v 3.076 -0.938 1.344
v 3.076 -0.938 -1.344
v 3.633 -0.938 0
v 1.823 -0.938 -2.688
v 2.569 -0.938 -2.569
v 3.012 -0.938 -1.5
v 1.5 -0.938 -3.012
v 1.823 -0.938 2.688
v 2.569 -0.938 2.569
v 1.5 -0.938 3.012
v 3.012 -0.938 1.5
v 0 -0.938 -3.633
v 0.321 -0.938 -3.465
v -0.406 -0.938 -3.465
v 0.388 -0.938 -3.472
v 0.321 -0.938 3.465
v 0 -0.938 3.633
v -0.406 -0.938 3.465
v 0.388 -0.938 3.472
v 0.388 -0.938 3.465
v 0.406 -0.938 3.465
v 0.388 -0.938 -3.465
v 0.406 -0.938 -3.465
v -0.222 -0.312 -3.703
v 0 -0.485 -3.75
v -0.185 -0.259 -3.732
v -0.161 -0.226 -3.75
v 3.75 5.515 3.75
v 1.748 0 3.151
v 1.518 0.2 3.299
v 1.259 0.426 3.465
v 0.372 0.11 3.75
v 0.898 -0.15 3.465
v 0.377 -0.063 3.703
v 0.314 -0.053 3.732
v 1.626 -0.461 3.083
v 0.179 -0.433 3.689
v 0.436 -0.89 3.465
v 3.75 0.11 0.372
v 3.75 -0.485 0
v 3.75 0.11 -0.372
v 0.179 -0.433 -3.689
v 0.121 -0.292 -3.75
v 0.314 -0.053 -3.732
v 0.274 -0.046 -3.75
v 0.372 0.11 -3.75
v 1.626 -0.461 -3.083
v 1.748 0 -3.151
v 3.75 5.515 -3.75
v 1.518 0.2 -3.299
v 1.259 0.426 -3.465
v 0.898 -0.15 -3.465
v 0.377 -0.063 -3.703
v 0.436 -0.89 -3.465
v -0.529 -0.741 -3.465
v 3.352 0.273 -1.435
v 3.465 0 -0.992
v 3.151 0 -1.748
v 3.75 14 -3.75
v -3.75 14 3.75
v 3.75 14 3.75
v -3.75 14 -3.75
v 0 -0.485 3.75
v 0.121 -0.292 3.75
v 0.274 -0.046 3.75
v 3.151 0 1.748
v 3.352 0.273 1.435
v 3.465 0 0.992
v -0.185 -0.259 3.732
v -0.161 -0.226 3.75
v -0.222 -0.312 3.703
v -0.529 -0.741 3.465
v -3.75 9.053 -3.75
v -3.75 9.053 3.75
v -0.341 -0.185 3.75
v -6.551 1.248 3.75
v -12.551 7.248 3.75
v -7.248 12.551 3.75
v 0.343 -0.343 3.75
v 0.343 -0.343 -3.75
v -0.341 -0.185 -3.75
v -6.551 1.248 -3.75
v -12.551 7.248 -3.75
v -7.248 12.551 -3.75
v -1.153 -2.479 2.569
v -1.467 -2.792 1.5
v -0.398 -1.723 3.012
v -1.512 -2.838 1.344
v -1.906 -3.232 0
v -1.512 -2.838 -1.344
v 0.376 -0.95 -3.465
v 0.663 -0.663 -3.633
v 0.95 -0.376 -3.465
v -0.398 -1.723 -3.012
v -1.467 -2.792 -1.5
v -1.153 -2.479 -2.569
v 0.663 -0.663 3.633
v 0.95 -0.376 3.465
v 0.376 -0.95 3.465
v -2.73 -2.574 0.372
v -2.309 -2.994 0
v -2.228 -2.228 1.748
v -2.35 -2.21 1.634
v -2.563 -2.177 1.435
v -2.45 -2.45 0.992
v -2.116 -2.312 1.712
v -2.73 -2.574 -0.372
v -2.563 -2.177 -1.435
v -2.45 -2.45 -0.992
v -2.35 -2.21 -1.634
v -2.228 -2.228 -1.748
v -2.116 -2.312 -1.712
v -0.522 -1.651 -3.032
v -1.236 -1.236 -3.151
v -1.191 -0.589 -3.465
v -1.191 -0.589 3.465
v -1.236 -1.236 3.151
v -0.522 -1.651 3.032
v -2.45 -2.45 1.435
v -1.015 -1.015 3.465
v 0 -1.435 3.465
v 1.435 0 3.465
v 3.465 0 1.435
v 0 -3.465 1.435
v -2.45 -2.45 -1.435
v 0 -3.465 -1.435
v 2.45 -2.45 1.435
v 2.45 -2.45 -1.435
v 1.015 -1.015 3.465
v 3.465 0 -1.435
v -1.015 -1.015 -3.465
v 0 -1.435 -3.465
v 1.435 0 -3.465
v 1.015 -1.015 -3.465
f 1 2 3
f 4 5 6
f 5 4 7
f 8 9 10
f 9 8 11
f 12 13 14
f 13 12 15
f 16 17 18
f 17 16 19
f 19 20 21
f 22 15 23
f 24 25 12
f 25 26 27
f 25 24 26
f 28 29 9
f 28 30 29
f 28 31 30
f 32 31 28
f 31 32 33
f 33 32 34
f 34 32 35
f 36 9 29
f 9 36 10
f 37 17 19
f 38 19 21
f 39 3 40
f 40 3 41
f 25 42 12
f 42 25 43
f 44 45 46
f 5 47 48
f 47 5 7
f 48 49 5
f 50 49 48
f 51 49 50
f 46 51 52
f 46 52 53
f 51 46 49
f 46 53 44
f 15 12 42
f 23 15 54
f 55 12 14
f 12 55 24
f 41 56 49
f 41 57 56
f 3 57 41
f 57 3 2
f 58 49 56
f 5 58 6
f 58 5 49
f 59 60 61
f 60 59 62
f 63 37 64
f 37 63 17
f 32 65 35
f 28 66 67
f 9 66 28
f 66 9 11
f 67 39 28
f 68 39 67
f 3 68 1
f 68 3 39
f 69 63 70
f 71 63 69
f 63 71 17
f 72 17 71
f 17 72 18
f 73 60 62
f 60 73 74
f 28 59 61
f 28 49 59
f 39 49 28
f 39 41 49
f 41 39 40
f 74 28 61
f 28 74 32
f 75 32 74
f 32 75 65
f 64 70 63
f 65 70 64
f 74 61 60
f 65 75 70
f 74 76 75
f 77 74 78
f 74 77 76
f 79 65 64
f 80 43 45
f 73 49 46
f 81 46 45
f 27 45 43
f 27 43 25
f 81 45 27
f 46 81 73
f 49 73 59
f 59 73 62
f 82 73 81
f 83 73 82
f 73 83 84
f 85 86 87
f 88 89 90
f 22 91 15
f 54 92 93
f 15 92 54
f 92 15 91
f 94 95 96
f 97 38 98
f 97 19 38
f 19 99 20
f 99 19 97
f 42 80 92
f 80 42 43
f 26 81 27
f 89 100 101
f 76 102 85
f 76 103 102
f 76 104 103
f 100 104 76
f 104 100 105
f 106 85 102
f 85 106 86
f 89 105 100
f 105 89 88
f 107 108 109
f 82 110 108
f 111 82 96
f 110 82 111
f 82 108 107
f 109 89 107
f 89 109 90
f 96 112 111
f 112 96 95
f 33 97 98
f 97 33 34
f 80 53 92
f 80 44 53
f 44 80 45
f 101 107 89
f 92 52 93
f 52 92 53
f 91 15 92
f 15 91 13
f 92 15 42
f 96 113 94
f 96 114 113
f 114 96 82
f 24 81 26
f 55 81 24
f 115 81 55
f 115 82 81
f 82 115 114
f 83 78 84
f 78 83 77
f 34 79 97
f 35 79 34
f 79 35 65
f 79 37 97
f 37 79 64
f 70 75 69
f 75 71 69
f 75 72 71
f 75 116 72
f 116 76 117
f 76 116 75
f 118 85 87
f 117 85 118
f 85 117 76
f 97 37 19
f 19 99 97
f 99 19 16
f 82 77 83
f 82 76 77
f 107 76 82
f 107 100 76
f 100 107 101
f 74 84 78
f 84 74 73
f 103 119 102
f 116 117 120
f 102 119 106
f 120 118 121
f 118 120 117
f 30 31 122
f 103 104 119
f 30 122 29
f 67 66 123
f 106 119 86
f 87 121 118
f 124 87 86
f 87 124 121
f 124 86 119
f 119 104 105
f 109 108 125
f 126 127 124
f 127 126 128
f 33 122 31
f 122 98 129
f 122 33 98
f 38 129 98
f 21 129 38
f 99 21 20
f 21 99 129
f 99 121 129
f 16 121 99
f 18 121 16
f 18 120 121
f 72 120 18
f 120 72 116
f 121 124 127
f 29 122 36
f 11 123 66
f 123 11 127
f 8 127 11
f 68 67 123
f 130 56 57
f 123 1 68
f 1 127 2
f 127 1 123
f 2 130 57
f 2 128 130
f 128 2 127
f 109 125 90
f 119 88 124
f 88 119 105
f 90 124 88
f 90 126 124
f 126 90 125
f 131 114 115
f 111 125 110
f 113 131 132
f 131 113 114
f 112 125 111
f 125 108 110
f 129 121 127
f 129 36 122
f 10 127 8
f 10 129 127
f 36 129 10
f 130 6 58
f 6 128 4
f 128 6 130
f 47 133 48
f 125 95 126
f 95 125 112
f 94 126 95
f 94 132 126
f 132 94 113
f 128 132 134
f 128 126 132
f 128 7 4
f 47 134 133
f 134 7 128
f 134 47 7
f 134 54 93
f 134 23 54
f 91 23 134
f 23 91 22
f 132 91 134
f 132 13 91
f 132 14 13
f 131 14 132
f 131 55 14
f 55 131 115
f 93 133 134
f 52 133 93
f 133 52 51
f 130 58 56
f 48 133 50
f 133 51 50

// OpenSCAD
$fn=8;
sphere(r = 3.75);
rotate([90,0, 180]) {
    translate([0,0,-0.9375]) {
	intersection() {
	    cylinder(h = 14.9375, r1 = 3.63281, r2 = 7.5, center = false);
	    translate([0,0,8.775]) cube([7.5, 7.5, 17.75], center = true);
	}
    }
}
rotate([90,0, 225]) {
    translate([0,0,-0.9375]) {
	intersection() {
	    cylinder(h = 14.9375, r1 = 3.63281, r2 = 7.5, center = false);
	    translate([0,0,8.775]) cube([7.5, 7.5, 17.75], center = true);
	}
    }
}
